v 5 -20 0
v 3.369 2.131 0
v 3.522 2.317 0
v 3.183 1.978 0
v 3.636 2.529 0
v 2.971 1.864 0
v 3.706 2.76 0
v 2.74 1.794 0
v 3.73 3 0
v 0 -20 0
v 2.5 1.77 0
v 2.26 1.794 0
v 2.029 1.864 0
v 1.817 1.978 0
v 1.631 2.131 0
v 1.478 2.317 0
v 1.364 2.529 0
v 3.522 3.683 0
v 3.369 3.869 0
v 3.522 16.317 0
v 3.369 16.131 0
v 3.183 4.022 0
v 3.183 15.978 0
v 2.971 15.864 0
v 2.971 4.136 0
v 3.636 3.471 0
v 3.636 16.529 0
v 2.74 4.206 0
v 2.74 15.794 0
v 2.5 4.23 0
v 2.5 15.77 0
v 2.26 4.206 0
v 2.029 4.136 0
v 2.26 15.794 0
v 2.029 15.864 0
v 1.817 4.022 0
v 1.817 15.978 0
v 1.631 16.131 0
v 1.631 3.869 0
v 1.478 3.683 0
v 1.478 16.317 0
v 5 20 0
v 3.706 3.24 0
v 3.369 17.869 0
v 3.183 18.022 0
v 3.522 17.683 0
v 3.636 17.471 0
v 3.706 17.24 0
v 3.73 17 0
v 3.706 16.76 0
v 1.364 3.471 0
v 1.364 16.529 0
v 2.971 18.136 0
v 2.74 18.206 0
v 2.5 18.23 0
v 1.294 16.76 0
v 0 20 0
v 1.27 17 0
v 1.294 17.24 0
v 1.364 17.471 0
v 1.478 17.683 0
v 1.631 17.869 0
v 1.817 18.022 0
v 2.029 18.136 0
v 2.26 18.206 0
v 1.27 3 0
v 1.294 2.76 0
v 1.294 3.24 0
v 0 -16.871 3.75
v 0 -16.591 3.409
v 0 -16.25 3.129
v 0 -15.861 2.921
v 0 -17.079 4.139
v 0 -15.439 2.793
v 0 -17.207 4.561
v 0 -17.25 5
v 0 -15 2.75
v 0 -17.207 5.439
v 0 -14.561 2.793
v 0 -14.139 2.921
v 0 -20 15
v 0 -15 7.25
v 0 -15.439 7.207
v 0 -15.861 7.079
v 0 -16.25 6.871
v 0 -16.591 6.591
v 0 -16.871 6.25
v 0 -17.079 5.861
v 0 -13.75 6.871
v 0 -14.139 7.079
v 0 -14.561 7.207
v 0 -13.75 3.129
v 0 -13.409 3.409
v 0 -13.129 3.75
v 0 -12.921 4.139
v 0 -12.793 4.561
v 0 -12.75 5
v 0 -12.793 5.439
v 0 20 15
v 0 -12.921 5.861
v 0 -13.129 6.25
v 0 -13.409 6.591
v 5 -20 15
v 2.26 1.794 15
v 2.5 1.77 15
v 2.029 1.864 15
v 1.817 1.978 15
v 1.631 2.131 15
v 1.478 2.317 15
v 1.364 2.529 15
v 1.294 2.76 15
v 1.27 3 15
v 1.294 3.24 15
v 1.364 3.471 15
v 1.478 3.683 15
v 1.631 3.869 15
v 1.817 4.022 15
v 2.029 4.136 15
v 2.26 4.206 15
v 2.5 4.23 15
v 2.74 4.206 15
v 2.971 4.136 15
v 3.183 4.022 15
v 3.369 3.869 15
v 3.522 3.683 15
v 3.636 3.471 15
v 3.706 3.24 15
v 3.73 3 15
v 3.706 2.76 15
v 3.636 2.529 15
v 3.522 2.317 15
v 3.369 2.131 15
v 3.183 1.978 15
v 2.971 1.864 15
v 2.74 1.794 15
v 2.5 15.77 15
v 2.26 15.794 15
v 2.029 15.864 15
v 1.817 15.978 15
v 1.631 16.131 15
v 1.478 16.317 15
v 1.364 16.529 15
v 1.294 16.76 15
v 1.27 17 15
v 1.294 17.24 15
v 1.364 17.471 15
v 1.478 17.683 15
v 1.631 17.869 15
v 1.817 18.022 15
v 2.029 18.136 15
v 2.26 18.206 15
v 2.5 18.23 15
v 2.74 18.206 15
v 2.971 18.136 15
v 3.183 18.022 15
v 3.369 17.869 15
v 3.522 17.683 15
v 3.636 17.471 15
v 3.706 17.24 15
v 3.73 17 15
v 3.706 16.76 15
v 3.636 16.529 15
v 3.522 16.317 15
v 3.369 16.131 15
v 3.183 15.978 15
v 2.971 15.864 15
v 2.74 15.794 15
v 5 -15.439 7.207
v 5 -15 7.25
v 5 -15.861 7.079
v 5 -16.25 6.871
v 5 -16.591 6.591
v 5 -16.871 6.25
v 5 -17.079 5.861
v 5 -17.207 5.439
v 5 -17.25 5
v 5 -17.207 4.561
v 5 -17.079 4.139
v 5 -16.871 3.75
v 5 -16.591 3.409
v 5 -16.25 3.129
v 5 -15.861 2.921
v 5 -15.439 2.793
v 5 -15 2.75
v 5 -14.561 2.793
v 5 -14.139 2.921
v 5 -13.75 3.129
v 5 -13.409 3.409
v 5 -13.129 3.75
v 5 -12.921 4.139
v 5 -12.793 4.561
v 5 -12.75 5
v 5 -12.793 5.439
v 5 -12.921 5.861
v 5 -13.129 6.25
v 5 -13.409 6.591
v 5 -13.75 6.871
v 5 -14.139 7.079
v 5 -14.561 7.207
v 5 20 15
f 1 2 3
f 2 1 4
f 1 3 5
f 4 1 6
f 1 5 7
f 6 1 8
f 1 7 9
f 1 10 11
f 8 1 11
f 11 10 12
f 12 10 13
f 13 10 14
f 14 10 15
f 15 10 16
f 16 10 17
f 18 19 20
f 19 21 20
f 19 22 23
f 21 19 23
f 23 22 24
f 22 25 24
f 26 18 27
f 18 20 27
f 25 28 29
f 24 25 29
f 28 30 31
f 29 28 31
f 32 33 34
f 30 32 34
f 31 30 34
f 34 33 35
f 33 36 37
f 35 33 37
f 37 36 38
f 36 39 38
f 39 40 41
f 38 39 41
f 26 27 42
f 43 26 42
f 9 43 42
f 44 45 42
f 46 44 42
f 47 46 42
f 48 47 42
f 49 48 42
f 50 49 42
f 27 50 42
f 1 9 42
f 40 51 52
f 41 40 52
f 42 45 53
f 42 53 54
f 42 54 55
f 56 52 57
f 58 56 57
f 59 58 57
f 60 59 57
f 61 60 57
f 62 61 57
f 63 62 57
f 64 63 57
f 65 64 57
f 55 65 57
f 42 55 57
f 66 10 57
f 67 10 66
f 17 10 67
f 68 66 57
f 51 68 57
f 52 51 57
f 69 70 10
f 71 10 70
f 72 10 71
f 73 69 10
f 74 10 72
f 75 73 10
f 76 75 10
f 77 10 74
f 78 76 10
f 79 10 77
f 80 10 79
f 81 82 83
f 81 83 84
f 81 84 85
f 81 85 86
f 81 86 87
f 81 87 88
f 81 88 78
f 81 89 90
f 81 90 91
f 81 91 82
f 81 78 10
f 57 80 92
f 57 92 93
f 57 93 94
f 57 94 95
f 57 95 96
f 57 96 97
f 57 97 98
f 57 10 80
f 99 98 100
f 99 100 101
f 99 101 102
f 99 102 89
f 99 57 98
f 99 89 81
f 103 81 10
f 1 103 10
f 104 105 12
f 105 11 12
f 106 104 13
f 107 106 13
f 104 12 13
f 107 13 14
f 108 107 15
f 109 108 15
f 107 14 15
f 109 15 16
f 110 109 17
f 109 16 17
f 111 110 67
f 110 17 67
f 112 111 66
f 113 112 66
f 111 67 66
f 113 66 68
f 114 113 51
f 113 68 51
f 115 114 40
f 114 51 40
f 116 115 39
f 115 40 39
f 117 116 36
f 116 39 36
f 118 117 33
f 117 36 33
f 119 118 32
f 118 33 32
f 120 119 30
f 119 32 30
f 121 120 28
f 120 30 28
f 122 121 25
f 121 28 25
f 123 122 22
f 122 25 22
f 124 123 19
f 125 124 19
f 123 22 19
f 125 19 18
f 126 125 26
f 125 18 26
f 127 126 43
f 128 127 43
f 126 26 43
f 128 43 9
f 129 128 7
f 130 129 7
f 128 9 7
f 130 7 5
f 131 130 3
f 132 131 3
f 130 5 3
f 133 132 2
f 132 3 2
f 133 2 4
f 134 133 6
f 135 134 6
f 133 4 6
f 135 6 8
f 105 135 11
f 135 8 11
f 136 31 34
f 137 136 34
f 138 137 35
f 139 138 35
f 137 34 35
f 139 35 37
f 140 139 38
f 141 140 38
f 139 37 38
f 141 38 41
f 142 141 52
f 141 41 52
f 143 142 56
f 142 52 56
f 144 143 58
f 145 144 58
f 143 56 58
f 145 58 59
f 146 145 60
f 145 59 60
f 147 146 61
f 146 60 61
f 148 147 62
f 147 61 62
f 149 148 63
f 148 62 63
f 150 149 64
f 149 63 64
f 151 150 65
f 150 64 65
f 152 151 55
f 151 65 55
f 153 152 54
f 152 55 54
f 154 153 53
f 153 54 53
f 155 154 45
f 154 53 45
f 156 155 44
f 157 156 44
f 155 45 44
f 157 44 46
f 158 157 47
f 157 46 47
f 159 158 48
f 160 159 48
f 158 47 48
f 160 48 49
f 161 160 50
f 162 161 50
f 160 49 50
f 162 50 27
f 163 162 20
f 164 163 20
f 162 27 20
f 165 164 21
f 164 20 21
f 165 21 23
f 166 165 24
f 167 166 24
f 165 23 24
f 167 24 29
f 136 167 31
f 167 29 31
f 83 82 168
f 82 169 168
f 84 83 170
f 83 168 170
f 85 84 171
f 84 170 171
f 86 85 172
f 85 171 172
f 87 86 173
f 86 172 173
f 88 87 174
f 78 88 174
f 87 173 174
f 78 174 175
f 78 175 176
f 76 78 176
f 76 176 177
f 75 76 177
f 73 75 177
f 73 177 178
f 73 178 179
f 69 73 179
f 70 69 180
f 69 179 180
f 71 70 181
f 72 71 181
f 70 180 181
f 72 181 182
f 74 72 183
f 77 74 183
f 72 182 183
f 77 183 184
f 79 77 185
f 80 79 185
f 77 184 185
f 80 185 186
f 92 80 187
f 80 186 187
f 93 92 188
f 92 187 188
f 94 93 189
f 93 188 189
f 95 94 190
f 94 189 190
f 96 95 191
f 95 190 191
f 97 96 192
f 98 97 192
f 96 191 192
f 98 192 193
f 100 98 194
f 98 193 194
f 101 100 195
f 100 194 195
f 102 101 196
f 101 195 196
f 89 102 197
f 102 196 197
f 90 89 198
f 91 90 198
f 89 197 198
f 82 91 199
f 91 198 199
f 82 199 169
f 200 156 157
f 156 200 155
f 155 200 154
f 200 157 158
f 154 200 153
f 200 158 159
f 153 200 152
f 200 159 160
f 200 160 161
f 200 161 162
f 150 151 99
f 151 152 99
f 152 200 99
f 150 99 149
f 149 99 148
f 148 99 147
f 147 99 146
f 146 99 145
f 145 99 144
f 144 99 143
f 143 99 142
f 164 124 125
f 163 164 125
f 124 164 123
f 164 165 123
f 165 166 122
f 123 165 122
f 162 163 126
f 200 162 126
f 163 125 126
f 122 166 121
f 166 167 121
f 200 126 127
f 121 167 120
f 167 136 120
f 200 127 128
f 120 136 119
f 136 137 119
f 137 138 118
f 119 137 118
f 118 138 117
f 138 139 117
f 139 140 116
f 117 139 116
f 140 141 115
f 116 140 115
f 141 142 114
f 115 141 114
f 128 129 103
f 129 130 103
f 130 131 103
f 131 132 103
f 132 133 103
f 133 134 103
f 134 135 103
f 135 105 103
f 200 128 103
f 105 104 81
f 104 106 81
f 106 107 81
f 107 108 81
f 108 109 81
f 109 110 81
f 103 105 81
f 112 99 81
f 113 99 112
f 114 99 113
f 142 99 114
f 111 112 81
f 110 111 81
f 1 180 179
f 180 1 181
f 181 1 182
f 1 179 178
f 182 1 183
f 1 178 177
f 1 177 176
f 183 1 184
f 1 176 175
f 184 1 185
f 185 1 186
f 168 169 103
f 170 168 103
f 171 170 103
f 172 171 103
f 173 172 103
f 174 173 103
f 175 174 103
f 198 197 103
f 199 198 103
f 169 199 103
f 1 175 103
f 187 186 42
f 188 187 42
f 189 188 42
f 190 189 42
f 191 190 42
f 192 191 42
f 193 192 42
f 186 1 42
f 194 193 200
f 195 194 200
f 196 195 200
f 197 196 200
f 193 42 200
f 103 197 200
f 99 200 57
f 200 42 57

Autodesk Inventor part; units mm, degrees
ref_plane "YZ Plane" through (0, 0, 0) normal (1, 0, 0) x (0, 1, 0)
ref_plane "XZ Plane" through (0, 0, 0) normal (0, 1, 0) x (-1, 0, 0)
ref_plane "XY Plane" through (0, 0, 0) normal (0, 0, 1) x (1, 0, 0)
sketch "Sketch1" plane through (0, 0, 0) normal (0, 0, 1) x (1, 0, 0)
  line L0 (0, 0) -> (5, 0)
  line L1 (5, 0) -> (5, 20)
  line L2 (5, 20) -> (0, 20)
  line L3 (0, 20) -> (0, 0)
  dimension "d0" = 5
  dimension "d1" = 20
extrude "Extrusion1" add sketch "Sketch1" along normal blind 15
sketch "Sketch2" plane through (0, 0, 15) normal (0, 0, 1) x (1, 0, 0)
  line L0 (5, 20) -> (0, 20) projected
  circle A0 centre (2.5, 3) radius 1.5
  line L1 (0, 20) -> (0, 0) projected
  line L2 (0, 10) -> (5, 10)
  line L3 (5, 0) -> (5, 20) projected
  circle A1 centre (2.5, 17) radius 1.5
  line L4 (0, 0) -> (5, 0) projected
  point P0 (2.5, 0)
  dimension "d4" = 3
  dimension "d12" = 3
hole "Hole1" at (2.5, 17, 15) at (2.5, 3, 15) direction (0, 0, -1) diameter 2.459 end through all thread size "M3x0.5" class "6H" standard "ISO Metric profile"
sketch "Sketch3" plane through (0, 0, 15) normal (0, 0, 1) x (1, 0, 0)
  line L0 (0, 20) -> (0, 0) projected
  line L1 (0, 10) -> (5, 10)
  line L2 (5, 0) -> (5, 20) projected
sketch "Sketch6" plane through (0, 0, 0) normal (-1, 0, 0) x (0, 0, 1)
  line L0 (0, 0) -> (0, 20) projected
  line L1 (0, 0) -> (15, 0)
  line L2 (15, 0) -> (15, -20)
  line L3 (15, -20) -> (0, -20)
  line L4 (0, -20) -> (0, 0)
  dimension "d24" = 15
  dimension "d25" = 20
extrude "Extrusion2" add sketch "Sketch6" against normal blind 5
sketch "Sketch9" plane through (0, 20, 0) normal (-1, 0, 0) x (0, 0, 1)
  line L0 (0, -20) -> (15, -20)
  line L1 (15, 0) -> (15, -40) projected
  circle A0 centre (5, -35) radius 2.5
  line L2 (0, -40) -> (15, -40) projected
  line L3 (0, 0) -> (0, -40) projected
  point P0 (7.5, -40)
  dimension "d28" = 5
  dimension "d37" = 5
  dimension "d38" = 5
hole "Hole3" at (0, -15, 5) direction (1, 0, 0) diameter 4.5 end through all clearance for "Countersunk Flat Head Screw ISO 2009/7046" size "M4" standard "ISO"
properties part number "Al Attach block"
